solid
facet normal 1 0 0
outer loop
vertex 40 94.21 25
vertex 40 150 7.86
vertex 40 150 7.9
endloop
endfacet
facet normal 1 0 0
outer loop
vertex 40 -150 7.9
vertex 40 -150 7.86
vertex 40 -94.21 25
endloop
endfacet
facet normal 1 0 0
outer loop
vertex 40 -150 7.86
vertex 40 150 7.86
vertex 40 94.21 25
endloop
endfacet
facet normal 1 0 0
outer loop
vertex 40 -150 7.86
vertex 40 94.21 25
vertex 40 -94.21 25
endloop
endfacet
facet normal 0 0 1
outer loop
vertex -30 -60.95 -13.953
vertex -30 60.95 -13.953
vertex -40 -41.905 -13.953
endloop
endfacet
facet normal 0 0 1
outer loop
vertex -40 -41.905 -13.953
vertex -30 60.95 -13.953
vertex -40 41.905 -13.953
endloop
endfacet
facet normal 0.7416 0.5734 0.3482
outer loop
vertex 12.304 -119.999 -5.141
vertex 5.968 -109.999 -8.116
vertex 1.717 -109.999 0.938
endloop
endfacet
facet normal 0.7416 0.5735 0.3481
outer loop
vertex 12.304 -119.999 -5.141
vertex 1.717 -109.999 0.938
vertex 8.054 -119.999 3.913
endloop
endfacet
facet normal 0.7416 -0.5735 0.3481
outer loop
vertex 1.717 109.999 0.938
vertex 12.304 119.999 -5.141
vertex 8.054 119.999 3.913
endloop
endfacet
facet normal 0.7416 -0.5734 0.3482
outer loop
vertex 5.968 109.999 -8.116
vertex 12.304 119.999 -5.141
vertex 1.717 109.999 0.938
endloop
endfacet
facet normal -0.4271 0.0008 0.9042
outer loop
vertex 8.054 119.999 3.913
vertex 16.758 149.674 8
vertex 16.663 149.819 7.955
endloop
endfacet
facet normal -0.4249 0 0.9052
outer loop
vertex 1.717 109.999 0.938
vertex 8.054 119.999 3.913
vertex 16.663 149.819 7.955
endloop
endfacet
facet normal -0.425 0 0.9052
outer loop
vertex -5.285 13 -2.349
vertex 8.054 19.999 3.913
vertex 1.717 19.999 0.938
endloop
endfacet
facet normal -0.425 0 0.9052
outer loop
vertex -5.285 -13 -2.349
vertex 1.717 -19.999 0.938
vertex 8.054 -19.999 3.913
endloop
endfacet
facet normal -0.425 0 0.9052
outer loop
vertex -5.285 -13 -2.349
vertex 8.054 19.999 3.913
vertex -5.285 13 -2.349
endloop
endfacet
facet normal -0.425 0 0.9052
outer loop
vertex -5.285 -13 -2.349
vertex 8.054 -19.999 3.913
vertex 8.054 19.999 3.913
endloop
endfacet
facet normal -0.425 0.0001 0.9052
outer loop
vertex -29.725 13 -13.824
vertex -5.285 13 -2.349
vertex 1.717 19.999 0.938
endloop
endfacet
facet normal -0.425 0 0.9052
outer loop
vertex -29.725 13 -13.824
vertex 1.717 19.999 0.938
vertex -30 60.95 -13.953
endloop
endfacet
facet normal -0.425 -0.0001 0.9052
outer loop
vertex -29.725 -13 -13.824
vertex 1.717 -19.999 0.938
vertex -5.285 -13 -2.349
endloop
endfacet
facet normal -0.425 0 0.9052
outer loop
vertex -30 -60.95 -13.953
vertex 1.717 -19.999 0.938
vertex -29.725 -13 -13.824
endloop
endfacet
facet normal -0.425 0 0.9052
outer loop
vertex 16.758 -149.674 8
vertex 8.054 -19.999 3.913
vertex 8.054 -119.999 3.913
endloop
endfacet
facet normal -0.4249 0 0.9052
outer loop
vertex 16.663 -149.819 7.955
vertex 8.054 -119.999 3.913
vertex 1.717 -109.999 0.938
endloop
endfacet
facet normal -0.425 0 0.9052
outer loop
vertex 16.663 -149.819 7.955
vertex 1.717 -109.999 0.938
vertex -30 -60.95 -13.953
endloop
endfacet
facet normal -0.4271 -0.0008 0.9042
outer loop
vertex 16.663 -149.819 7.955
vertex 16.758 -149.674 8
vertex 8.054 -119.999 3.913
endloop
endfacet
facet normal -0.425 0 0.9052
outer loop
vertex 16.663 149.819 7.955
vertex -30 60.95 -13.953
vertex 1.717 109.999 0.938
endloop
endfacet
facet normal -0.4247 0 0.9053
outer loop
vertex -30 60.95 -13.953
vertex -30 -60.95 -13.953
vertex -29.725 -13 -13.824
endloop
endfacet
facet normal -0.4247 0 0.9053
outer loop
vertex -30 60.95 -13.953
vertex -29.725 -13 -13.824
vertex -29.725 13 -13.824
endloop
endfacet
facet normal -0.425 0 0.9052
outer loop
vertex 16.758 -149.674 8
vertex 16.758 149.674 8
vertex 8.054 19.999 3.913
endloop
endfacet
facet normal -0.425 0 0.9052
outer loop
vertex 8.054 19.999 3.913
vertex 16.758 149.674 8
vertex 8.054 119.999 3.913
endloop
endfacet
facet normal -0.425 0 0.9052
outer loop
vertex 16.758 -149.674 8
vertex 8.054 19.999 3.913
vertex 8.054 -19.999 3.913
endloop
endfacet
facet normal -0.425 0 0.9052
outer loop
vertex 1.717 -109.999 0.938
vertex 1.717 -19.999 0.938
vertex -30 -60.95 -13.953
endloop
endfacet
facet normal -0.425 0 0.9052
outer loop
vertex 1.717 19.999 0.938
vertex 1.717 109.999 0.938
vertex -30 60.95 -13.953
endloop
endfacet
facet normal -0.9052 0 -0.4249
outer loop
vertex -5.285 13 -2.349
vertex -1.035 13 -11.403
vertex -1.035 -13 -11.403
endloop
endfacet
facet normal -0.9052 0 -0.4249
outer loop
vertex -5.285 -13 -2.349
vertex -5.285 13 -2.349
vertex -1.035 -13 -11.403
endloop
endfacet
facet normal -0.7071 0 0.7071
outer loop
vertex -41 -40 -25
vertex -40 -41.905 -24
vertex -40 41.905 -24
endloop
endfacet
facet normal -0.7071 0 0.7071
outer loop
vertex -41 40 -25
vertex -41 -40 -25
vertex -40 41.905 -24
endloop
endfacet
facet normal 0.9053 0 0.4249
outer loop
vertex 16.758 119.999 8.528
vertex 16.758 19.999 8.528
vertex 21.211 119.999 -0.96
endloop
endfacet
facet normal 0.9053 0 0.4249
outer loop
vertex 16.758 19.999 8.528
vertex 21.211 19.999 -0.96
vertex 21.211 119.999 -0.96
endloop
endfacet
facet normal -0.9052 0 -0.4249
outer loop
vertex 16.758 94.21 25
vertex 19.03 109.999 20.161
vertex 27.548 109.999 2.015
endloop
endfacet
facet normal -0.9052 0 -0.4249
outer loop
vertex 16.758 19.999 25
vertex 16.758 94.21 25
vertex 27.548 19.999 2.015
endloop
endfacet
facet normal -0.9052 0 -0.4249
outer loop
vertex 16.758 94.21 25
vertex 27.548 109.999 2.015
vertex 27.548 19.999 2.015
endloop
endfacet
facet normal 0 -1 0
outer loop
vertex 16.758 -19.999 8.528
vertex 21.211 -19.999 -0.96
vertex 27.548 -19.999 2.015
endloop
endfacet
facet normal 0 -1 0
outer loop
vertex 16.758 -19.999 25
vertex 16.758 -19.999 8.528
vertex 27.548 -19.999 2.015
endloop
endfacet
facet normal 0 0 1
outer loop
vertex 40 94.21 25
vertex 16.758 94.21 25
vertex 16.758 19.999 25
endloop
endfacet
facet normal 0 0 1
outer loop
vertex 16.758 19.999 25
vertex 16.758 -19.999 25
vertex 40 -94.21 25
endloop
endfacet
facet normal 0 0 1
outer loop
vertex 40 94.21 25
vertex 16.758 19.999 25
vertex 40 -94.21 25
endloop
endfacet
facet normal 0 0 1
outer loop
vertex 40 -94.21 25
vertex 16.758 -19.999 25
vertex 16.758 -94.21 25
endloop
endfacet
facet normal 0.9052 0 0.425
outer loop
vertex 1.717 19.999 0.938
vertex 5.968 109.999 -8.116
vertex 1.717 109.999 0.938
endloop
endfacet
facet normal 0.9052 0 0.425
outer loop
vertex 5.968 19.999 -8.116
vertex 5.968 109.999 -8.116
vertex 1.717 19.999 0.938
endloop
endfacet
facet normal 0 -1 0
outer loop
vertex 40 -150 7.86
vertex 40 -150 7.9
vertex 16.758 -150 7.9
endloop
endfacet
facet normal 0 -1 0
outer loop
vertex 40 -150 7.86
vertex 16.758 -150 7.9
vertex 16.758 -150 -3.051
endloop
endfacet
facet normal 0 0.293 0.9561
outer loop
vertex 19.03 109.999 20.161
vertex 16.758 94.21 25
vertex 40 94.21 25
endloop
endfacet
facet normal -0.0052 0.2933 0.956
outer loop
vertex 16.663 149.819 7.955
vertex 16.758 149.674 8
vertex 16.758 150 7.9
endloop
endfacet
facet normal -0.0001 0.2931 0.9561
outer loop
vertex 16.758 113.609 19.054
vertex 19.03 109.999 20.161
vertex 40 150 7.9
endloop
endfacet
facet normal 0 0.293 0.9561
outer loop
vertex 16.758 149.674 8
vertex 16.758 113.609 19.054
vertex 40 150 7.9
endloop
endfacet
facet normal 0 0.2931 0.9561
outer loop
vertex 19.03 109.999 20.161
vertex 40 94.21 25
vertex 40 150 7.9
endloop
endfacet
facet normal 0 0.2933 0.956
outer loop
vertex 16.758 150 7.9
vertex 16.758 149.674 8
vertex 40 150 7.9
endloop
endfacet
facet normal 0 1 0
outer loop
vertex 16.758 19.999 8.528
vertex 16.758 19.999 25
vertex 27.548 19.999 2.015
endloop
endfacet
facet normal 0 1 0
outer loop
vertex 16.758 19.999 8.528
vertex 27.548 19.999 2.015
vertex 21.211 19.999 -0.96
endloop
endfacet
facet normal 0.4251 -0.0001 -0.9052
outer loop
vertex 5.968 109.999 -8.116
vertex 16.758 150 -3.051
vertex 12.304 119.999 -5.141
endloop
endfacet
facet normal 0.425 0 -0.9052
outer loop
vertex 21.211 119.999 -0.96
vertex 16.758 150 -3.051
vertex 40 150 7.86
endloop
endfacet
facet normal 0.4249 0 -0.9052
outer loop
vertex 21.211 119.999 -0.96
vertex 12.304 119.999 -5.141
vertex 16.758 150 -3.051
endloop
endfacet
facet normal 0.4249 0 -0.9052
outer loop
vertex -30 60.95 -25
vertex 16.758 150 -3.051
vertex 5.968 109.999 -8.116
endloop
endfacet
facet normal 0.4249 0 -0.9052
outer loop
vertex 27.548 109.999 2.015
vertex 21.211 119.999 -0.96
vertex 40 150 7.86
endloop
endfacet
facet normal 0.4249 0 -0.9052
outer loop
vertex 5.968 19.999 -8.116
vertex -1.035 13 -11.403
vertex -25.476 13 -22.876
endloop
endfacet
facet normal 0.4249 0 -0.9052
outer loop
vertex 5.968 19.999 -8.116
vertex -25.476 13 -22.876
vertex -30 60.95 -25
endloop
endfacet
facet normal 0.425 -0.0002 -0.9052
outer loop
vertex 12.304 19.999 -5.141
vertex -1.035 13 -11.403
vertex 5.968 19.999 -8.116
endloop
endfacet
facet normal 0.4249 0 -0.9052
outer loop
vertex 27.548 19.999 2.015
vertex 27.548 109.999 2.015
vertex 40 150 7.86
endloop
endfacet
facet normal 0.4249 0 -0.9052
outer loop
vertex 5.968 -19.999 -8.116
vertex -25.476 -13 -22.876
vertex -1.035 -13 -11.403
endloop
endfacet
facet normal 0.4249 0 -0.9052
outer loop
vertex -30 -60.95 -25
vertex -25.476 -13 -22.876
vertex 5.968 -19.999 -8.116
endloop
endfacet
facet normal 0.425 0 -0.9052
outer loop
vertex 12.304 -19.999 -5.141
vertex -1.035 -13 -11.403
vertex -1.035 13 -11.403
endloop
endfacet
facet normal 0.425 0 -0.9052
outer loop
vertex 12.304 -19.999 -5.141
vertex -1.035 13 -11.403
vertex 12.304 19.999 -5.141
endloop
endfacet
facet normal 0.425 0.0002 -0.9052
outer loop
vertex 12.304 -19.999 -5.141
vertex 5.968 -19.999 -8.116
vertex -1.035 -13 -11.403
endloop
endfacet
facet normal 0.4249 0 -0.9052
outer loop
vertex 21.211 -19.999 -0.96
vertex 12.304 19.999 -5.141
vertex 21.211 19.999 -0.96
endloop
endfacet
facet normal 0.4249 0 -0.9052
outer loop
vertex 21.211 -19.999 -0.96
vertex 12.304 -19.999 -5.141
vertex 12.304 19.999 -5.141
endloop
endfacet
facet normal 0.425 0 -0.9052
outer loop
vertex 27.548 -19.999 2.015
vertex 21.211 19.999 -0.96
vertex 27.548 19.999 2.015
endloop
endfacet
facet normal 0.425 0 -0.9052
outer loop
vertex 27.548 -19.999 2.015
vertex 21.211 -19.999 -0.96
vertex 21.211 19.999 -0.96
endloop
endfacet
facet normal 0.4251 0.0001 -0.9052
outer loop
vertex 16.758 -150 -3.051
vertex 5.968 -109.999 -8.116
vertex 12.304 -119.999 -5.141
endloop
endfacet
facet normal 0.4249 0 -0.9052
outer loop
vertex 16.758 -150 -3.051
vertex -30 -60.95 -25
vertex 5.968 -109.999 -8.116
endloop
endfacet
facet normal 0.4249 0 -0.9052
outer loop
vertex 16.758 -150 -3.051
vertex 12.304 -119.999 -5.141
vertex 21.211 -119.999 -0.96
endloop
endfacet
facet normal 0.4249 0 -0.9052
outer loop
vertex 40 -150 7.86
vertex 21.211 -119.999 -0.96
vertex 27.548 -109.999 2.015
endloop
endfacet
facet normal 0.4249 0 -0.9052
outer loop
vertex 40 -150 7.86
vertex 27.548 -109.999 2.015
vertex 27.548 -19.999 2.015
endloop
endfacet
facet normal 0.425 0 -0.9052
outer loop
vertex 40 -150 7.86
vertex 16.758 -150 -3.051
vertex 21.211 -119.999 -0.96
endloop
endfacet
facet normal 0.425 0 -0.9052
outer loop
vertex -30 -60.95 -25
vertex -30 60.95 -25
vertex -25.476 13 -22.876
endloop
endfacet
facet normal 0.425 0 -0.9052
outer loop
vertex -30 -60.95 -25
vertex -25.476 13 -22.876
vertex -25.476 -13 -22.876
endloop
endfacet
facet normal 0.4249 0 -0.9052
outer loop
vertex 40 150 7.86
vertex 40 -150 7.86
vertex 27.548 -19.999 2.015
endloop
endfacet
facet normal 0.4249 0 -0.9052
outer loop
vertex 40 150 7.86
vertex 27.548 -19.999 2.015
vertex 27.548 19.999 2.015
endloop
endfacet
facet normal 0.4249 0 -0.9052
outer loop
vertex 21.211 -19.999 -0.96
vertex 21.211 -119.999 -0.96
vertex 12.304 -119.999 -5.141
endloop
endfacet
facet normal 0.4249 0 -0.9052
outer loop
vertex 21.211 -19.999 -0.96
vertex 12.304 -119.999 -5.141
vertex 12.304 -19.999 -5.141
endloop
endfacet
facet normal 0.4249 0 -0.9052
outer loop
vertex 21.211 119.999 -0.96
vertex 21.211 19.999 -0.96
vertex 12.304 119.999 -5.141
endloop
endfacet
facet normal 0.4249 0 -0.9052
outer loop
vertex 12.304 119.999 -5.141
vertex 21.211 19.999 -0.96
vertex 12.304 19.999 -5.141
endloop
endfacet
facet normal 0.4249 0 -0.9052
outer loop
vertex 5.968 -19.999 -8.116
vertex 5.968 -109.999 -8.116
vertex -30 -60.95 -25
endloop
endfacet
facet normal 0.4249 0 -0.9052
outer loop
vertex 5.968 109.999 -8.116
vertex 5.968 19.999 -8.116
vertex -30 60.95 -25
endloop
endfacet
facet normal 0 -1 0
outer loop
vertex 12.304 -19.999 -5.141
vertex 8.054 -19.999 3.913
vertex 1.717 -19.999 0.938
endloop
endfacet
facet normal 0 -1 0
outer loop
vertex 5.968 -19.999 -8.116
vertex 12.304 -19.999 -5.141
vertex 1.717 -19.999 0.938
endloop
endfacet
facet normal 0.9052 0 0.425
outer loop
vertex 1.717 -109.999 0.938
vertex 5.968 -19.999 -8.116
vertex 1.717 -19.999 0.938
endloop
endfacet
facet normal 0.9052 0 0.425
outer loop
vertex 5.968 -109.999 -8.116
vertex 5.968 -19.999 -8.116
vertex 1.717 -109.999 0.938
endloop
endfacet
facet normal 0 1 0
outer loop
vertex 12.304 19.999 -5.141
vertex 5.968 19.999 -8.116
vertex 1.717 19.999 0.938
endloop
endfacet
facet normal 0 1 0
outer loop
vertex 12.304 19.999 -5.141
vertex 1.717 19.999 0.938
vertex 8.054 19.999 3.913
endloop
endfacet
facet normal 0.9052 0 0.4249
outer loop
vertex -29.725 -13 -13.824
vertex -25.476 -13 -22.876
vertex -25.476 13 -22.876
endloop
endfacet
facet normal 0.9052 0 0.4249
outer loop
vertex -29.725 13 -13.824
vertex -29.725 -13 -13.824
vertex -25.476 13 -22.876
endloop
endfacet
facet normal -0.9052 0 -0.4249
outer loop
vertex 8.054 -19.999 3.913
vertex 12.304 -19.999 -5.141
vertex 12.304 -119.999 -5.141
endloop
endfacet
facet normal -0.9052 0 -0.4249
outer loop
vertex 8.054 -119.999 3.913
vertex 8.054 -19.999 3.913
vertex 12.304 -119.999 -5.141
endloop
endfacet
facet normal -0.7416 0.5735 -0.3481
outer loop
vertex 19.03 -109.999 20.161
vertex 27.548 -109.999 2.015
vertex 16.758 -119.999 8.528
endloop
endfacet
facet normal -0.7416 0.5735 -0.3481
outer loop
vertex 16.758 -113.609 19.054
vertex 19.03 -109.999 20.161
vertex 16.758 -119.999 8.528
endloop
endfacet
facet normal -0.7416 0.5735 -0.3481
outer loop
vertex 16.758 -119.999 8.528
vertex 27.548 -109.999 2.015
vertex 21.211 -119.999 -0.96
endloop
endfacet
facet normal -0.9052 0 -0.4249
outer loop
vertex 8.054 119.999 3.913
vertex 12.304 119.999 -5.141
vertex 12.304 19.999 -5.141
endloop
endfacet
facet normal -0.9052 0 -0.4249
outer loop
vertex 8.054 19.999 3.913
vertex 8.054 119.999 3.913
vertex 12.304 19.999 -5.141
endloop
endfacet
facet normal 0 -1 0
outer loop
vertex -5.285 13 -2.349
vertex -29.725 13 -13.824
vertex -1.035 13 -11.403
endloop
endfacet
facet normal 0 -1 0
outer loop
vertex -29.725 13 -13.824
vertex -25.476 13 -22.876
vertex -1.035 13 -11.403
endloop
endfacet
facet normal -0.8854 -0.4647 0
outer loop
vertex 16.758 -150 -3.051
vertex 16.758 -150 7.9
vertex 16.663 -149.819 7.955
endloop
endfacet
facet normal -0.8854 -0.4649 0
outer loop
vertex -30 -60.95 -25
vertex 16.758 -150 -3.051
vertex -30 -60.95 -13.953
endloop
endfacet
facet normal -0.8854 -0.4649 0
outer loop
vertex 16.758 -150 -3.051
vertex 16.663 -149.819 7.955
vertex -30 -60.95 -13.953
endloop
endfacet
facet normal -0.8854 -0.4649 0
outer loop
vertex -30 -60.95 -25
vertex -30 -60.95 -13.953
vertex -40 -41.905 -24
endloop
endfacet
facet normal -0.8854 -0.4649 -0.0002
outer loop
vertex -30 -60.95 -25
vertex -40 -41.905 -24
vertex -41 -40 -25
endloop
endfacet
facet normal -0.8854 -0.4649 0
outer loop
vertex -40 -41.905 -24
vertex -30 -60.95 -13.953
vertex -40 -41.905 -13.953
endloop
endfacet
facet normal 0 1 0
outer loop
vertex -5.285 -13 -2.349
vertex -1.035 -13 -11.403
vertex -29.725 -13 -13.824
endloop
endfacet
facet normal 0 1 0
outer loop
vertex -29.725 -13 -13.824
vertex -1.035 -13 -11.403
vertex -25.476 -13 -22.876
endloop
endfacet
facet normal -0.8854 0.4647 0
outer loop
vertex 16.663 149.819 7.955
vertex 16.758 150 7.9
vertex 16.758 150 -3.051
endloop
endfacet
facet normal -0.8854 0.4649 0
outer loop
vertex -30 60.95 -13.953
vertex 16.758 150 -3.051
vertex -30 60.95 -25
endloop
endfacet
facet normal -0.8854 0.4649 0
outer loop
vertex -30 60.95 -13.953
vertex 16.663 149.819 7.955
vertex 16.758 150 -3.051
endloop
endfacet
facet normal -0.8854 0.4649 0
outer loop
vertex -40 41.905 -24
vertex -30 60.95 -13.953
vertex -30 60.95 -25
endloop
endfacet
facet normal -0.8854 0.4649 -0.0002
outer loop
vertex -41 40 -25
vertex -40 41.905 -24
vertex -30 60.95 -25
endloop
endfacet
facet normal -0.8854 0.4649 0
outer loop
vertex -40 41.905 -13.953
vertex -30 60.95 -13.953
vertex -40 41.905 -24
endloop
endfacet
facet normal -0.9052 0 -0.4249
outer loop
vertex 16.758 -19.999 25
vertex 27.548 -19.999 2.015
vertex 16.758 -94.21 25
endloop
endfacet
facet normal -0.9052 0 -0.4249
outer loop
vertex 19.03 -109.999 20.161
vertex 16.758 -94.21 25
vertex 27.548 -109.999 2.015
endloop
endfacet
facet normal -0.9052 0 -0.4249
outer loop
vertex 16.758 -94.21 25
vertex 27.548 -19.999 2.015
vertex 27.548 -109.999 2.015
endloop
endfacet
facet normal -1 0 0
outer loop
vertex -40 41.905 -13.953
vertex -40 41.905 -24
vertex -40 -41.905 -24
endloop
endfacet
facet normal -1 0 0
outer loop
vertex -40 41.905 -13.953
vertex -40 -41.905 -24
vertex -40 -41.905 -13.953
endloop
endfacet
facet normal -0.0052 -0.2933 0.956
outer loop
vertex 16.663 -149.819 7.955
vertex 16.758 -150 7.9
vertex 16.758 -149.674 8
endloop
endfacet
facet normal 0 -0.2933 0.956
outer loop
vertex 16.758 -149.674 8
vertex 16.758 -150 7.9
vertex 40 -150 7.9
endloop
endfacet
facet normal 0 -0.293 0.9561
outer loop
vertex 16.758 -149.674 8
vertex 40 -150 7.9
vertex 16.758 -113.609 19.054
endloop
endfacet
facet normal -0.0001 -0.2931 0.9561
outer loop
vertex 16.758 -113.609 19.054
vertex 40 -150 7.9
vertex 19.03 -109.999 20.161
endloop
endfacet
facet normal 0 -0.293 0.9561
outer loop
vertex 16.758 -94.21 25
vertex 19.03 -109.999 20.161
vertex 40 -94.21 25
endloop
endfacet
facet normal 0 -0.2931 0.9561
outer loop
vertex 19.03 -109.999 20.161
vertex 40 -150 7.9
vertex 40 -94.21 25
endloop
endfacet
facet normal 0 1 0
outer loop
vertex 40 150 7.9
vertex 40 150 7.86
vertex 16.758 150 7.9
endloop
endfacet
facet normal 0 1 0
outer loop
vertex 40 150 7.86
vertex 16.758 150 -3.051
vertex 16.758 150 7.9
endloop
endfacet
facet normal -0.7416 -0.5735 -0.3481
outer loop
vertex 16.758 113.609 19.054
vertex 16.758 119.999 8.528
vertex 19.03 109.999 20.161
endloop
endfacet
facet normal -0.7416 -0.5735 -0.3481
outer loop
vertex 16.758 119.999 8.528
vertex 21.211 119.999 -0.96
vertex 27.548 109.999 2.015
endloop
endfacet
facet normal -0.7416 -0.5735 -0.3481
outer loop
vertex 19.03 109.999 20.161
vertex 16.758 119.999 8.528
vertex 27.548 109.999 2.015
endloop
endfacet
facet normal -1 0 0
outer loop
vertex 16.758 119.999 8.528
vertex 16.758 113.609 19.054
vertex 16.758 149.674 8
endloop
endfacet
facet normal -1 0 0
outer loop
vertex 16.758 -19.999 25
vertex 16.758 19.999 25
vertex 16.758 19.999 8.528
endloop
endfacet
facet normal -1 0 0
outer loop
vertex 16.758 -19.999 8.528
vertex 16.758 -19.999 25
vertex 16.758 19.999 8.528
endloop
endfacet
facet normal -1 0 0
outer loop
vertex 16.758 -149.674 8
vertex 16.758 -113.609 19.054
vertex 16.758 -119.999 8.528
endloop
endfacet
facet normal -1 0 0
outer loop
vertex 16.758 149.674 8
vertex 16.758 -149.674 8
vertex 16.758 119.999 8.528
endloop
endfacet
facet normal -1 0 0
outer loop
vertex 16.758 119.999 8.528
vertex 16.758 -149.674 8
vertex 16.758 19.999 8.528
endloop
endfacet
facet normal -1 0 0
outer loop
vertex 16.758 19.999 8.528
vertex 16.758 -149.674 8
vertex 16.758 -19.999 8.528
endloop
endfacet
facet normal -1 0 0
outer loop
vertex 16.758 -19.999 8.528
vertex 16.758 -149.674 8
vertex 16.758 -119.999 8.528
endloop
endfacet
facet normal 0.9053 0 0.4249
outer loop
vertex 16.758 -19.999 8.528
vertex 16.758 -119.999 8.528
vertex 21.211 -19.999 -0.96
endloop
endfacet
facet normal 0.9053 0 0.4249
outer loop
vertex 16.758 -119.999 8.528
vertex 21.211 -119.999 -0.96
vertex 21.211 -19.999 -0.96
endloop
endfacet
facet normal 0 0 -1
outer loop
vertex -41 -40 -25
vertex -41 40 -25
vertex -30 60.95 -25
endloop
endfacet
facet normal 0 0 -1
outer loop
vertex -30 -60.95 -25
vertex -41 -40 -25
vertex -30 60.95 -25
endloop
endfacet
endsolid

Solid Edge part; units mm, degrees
sketch "Sketch1" plane through (0, 0, 0) normal (1, 0, 0) x (0, 1, 0)
  line L0 (-150, -25) -> (150, -25)
  line L1 (150, -25) -> (150, 25)
  line L2 (150, 25) -> (-150, 25)
  line L3 (-150, 25) -> (-150, -25)
  dimension "D1" = 300
  dimension "D2" = 50
extrude "Protrusion1" add sketch "Sketch1" along normal mid plane 80
sketch "Sketch2" plane through (40, 0, 0) normal (1, 0, 0) x (0, 1, 0)
  line L0 (-150, 7.9) -> (-94.21, 25)
  line L1 (-94.21, 25) -> (94.21, 25)
  line L2 (94.21, 25) -> (150, 7.9)
  dimension "D1" = 188.42
  dimension "D2" = 55.79
  dimension "D3" = 17.1
  dimension "D4" = 17.1
extrude "Cutout1" cut sketch "Sketch2" against normal through all material side at (40, -122.1197, 16.4978)
sketch "Sketch3" plane through (0, -150, -8.55) normal (0, -1, 0) x (1, 0, 0)
  line L0 (-30, -16.45) -> (40, 16.41)
  dimension "D1" = 70
  dimension "D2" = 10
  dimension "D3" = 32.86
extrude "Cutout2" cut sketch "Sketch3" against normal through all material side at (5.0212, -150, -8.6153)
sketch "Sketch4" plane through (0, -150, -8.55) normal (0, -1, 0) x (1, 0, 0)
  line L0 (16.7577, 33.55) -> (16.7577, 16.55)
  line L1 (16.7577, 16.55) -> (-30, -5.4027)
  line L2 (-30, -5.4027) -> (-40, -5.4027)
  dimension "D1" = 17
  dimension "D2" = 10
  dimension "D3" = 10
extrude "Cutout3" cut sketch "Sketch4" against normal through all material side at (16.7077, -150, 16.5)
sketch "Sketch5" plane through (0, -150, -8.55) normal (0, -1, 0) x (1, 0, 0)
  line L0 (-40, -16.45) -> (-41, -16.45)
  line L1 (-41, -16.45) -> (-40, -15.45)
  dimension "D1" = 1
  dimension "D2" = 1
extrude "Extrusionsausprägung_2" add sketch "Sketch5" against normal blind 300 material side at (-40.5, -150, -24.95)
sketch "Sketch6" plane through (28.3789, 0, 25) normal (0, 0, 1) x (0, -1, 0)
  line L0 (-150, -11.6211) -> (-40, -69.3789)
  line L1 (-40, -69.3789) -> (40, -69.3789)
  line L2 (150, -11.6211) -> (40, -69.3789)
  line L3 (150, 11.6211) -> (150, -11.6211)
  line L4 (-150, 11.6211) -> (150, 11.6211)
  line L5 (-150, 11.6211) -> (-150, -11.6211)
  dimension "D1" = 80
  dimension "D2" = 300
extrude "Cutout4" cut sketch "Sketch6" against normal through all flip side to cut
sketch "Sketch7" plane through (5, 0, -8.57) normal (0.4249, 0, -0.9052) x (0, 1, 0)
  line L0 (-109.9992, 24.9085) -> (-119.9992, 17.9088)
  line L1 (-119.9992, 17.9088) -> (-19.9992, 17.9088)
  line L2 (-19.9992, 17.9088) -> (-19.9992, 24.9085)
  line L3 (-19.9992, 24.9085) -> (-109.9992, 24.9085)
  line L4 (-19.9992, 8.0688) -> (-119.9992, 8.0688)
  line L5 (-109.9992, 1.0688) -> (-119.9992, 8.0688)
  line L6 (-19.9992, 1.0688) -> (-109.9992, 1.0688)
  line L7 (-19.9992, 8.0688) -> (-19.9992, 1.0688)
  dimension "D1" = 90
  dimension "D2" = 100
  dimension "D3" = 100
extrude "Cutout5" cut sketch "Sketch7" against normal through all
mirror "Mirror1" about plane through (0, 0, 0) normal (0, -1, 0) of "Cutout5"
sketch "Sketch8" plane through (5, 0, -8.57) normal (0.4249, 0, -0.9052) x (0, 1, 0)
  line L0 (-13, -33.6667) -> (13, -33.6667)
  line L1 (13, -33.6667) -> (13, -6.6667)
  line L2 (13, -6.6667) -> (-13, -6.6667)
  line L3 (-13, -6.6667) -> (-13, -33.6667)
  dimension "D1" = 26
  dimension "D2" = 27
extrude "Cutout7" cut sketch "Sketch8" against normal through all
extrude "Protrusion2" [suppressed]
